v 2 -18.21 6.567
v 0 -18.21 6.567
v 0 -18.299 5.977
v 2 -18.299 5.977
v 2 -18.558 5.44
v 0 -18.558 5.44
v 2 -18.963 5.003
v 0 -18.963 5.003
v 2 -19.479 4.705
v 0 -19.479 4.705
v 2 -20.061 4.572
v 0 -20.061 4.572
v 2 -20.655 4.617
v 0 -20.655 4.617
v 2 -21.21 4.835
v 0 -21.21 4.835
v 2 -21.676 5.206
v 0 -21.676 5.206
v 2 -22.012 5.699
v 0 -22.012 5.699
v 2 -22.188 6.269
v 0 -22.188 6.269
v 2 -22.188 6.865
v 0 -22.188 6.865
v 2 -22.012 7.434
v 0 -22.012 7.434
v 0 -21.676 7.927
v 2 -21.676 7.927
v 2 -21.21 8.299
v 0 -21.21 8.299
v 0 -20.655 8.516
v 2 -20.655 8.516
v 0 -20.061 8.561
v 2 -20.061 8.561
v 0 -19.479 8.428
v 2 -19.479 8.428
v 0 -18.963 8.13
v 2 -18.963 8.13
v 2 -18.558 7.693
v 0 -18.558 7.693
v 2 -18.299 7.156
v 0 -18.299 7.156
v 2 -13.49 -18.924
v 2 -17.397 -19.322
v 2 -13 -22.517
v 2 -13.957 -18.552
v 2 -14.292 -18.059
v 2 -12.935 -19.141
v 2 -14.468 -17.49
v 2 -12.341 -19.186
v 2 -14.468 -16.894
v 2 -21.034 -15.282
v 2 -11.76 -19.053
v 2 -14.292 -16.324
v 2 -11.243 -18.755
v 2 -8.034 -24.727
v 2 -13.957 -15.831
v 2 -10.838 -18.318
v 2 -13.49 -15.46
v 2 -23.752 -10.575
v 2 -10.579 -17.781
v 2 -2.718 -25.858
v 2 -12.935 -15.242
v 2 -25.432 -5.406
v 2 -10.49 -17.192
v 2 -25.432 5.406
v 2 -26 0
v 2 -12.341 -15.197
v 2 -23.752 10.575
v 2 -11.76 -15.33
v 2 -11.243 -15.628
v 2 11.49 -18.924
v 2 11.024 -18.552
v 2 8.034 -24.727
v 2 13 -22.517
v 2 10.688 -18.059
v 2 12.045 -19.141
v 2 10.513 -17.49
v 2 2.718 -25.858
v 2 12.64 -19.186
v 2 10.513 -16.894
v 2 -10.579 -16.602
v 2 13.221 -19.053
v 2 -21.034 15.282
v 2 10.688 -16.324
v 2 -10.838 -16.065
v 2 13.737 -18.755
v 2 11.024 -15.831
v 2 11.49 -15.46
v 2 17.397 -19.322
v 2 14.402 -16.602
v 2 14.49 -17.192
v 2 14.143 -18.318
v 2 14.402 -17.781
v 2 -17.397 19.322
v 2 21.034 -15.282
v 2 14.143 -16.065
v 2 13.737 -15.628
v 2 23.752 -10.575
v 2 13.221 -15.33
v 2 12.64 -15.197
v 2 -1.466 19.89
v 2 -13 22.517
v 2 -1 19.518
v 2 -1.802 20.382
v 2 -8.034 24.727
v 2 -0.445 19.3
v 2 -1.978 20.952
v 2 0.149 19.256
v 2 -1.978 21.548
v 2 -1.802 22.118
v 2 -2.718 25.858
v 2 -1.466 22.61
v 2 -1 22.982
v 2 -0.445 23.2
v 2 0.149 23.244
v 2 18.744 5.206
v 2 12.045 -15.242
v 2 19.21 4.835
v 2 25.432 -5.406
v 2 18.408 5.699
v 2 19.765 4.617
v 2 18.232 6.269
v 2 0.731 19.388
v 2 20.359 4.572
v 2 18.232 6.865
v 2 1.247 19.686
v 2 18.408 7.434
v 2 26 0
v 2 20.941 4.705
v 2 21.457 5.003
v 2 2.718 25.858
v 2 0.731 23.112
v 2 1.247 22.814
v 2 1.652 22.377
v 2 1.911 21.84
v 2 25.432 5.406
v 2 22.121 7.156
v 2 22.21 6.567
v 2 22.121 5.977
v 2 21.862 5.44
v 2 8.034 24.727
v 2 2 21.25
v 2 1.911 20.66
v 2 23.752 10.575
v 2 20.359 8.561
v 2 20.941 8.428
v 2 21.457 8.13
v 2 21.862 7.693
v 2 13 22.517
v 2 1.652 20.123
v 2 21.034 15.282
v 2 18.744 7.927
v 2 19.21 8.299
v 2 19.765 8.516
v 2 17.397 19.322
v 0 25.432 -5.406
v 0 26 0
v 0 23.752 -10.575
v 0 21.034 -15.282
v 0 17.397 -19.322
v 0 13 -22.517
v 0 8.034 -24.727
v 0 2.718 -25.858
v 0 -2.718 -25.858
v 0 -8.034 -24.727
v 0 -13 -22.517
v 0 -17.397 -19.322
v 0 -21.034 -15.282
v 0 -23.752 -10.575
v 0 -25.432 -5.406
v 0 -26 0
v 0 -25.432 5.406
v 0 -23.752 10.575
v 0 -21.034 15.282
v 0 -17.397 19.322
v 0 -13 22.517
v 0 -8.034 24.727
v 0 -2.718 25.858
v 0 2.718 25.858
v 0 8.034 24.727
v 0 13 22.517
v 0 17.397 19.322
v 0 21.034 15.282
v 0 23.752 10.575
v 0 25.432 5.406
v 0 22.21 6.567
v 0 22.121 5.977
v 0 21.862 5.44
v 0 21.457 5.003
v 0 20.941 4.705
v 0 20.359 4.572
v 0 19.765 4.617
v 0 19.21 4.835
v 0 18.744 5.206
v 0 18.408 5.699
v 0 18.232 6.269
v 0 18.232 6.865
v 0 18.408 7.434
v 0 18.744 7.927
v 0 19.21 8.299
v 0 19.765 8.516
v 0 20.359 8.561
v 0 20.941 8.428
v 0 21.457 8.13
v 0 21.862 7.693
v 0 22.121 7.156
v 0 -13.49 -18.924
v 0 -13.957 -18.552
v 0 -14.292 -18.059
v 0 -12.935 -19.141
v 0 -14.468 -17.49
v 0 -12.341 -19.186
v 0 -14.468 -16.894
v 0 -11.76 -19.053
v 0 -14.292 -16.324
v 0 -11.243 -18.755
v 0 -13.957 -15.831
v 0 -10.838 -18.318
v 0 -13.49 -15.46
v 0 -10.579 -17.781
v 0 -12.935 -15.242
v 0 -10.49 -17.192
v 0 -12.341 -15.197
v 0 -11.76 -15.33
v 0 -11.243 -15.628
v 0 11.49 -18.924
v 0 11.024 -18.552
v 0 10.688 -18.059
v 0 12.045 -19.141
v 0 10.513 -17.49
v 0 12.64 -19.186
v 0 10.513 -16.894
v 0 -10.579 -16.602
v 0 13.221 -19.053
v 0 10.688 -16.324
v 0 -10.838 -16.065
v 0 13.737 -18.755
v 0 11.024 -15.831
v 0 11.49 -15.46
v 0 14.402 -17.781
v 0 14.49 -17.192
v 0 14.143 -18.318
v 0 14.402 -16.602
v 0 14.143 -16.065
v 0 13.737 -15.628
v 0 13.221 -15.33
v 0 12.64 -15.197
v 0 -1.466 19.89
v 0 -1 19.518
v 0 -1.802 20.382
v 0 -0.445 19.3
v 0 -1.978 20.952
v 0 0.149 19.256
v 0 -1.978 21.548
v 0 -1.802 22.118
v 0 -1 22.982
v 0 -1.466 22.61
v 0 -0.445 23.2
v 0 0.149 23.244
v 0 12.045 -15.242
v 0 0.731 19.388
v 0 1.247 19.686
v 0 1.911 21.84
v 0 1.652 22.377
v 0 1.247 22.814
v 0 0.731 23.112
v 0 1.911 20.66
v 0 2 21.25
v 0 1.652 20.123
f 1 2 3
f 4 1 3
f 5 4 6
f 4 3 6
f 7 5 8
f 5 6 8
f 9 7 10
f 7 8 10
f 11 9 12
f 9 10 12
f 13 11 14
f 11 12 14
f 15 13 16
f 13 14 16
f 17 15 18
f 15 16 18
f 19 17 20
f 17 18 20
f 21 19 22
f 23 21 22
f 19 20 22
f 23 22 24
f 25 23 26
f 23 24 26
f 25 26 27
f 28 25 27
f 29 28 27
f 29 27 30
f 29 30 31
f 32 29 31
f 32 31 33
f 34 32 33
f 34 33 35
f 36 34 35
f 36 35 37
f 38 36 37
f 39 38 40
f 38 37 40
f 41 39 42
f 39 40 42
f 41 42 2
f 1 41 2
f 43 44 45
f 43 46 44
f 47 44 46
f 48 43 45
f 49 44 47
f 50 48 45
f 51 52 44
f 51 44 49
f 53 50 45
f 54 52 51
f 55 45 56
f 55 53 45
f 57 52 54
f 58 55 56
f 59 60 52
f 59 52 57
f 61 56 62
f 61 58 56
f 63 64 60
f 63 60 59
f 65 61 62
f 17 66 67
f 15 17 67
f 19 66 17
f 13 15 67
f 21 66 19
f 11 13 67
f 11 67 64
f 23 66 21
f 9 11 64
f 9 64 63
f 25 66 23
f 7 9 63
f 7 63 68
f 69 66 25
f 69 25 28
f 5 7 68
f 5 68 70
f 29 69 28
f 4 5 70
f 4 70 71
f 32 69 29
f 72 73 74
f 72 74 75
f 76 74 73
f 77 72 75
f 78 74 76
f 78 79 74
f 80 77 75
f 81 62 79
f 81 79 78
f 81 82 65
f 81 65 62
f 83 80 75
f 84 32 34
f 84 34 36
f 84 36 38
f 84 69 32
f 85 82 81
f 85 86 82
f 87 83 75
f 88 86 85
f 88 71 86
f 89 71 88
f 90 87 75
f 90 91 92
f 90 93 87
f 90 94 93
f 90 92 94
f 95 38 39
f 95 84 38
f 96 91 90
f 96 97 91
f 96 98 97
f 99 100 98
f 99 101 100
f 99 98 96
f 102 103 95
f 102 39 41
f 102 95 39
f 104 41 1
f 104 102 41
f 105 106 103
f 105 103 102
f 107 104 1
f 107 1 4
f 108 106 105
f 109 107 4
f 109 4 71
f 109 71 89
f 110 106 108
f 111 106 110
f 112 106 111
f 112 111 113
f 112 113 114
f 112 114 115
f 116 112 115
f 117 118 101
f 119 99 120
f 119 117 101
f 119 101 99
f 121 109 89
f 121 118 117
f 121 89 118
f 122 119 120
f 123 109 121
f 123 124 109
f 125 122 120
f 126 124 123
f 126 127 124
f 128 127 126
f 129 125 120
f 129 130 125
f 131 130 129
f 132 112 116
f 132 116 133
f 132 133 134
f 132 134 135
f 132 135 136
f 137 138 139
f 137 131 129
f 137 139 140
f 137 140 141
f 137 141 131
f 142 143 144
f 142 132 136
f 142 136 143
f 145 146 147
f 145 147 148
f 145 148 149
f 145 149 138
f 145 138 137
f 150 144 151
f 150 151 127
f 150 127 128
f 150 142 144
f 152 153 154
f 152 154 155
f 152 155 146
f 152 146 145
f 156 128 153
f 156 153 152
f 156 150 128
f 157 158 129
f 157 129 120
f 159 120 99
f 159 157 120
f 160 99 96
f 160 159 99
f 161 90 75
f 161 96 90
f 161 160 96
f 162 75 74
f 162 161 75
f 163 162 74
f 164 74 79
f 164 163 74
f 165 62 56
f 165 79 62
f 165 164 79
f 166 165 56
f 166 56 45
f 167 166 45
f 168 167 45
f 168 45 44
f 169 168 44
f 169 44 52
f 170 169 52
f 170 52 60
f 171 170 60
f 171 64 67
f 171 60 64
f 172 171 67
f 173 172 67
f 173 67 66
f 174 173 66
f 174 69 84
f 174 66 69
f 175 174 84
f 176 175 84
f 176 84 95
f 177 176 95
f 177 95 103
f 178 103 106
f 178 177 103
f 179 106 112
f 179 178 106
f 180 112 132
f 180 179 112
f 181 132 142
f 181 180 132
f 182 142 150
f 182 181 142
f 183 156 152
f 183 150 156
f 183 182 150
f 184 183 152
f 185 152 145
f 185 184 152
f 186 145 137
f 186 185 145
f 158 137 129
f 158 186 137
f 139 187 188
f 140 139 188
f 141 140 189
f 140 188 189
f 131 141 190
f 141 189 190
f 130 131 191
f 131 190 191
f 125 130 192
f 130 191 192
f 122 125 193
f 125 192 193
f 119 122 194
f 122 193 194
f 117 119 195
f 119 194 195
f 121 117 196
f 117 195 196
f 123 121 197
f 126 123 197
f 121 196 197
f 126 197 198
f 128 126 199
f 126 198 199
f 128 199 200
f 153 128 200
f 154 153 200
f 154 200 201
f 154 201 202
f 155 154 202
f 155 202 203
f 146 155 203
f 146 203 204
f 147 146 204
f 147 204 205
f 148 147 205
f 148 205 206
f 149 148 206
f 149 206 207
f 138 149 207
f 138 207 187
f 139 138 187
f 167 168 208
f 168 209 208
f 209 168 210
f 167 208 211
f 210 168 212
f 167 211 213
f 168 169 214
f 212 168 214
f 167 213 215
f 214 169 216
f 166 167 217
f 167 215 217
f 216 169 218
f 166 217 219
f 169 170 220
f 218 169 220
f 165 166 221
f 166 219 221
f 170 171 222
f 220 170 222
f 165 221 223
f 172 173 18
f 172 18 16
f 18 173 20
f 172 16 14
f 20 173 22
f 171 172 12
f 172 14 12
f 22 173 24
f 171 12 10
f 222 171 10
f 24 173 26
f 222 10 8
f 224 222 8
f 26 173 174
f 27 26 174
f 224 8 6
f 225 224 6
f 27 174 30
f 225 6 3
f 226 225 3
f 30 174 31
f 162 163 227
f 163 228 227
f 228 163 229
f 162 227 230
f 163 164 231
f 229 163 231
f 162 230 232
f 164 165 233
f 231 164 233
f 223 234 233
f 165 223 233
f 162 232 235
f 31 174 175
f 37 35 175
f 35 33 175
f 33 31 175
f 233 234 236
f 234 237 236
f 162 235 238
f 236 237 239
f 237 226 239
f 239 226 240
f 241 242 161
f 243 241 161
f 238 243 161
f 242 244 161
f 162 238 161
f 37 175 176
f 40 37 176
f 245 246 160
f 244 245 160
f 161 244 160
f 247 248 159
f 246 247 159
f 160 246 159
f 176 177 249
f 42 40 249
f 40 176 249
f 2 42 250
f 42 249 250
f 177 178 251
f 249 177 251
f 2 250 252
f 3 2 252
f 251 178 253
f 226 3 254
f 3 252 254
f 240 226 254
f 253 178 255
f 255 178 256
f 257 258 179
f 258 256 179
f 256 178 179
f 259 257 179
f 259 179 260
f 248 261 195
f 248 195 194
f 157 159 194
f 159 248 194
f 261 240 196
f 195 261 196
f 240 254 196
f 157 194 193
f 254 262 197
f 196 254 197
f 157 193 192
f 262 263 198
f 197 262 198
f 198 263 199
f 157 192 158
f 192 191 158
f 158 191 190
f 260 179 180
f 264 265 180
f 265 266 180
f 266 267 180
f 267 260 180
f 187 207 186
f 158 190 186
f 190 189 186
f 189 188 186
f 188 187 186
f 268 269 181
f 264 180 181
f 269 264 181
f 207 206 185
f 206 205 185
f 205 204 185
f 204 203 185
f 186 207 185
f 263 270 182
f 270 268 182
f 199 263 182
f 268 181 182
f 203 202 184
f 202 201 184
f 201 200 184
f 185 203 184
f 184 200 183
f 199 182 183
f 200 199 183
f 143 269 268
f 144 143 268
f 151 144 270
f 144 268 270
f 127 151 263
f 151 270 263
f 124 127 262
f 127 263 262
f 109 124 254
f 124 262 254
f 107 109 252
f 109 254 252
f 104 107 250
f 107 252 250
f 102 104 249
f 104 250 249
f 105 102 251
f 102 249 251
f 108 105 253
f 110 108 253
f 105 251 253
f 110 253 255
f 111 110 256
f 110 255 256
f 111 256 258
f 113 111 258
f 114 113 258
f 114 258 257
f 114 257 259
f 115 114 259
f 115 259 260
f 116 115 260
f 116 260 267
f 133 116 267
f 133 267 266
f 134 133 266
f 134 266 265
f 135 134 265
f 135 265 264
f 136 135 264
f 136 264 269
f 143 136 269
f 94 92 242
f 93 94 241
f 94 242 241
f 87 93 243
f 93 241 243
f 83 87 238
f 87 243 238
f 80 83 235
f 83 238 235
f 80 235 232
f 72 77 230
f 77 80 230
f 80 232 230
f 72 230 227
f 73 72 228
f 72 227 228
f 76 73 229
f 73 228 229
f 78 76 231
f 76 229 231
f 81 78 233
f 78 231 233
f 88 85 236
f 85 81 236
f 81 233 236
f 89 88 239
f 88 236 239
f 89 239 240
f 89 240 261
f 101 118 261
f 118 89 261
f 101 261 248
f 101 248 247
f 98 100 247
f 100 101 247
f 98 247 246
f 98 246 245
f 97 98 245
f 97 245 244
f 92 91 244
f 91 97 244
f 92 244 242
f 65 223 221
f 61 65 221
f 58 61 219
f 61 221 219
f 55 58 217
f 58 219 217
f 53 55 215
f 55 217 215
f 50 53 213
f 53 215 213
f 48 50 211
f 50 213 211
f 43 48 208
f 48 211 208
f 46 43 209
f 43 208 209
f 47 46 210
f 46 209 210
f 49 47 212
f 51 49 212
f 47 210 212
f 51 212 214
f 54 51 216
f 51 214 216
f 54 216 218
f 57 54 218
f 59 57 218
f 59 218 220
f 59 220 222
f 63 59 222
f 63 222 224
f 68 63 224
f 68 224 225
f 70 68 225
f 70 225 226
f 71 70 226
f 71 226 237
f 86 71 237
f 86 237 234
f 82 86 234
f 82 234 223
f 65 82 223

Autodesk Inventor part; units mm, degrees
ref_plane "YZ Plane" through (0, 0, 0) normal (1, 0, 0) x (0, 1, 0)
ref_plane "XZ Plane" through (0, 0, 0) normal (0, 1, 0) x (-1, 0, 0)
ref_plane "XY Plane" through (0, 0, 0) normal (0, 0, 1) x (1, 0, 0)
sketch "Sketch1" plane through (0, 0, 0) normal (1, 0, 0) x (0, 1, 0)
  circle A0 centre (0, 0) radius 21.25
  circle A1 centre (0, 0) radius 26
  circle A2 centre (0, 21.25) radius 2
  circle A3 centre (-20.21, 6.5666) radius 2
  circle A4 centre (-12.4904, -17.1916) radius 2
  circle A5 centre (12.4904, -17.1916) radius 2
  circle A6 centre (20.21, 6.5666) radius 2
  dimension "d0" = 42.5
  dimension "d1" = 52
  dimension "d2" = 4
  dimension "d5" = 360
extrude "Extrusion1" add sketch "Sketch1" along normal blind 2 contours A0 A5 A4 A3 A2 A6 | A1
properties part number "antenna_plate"
